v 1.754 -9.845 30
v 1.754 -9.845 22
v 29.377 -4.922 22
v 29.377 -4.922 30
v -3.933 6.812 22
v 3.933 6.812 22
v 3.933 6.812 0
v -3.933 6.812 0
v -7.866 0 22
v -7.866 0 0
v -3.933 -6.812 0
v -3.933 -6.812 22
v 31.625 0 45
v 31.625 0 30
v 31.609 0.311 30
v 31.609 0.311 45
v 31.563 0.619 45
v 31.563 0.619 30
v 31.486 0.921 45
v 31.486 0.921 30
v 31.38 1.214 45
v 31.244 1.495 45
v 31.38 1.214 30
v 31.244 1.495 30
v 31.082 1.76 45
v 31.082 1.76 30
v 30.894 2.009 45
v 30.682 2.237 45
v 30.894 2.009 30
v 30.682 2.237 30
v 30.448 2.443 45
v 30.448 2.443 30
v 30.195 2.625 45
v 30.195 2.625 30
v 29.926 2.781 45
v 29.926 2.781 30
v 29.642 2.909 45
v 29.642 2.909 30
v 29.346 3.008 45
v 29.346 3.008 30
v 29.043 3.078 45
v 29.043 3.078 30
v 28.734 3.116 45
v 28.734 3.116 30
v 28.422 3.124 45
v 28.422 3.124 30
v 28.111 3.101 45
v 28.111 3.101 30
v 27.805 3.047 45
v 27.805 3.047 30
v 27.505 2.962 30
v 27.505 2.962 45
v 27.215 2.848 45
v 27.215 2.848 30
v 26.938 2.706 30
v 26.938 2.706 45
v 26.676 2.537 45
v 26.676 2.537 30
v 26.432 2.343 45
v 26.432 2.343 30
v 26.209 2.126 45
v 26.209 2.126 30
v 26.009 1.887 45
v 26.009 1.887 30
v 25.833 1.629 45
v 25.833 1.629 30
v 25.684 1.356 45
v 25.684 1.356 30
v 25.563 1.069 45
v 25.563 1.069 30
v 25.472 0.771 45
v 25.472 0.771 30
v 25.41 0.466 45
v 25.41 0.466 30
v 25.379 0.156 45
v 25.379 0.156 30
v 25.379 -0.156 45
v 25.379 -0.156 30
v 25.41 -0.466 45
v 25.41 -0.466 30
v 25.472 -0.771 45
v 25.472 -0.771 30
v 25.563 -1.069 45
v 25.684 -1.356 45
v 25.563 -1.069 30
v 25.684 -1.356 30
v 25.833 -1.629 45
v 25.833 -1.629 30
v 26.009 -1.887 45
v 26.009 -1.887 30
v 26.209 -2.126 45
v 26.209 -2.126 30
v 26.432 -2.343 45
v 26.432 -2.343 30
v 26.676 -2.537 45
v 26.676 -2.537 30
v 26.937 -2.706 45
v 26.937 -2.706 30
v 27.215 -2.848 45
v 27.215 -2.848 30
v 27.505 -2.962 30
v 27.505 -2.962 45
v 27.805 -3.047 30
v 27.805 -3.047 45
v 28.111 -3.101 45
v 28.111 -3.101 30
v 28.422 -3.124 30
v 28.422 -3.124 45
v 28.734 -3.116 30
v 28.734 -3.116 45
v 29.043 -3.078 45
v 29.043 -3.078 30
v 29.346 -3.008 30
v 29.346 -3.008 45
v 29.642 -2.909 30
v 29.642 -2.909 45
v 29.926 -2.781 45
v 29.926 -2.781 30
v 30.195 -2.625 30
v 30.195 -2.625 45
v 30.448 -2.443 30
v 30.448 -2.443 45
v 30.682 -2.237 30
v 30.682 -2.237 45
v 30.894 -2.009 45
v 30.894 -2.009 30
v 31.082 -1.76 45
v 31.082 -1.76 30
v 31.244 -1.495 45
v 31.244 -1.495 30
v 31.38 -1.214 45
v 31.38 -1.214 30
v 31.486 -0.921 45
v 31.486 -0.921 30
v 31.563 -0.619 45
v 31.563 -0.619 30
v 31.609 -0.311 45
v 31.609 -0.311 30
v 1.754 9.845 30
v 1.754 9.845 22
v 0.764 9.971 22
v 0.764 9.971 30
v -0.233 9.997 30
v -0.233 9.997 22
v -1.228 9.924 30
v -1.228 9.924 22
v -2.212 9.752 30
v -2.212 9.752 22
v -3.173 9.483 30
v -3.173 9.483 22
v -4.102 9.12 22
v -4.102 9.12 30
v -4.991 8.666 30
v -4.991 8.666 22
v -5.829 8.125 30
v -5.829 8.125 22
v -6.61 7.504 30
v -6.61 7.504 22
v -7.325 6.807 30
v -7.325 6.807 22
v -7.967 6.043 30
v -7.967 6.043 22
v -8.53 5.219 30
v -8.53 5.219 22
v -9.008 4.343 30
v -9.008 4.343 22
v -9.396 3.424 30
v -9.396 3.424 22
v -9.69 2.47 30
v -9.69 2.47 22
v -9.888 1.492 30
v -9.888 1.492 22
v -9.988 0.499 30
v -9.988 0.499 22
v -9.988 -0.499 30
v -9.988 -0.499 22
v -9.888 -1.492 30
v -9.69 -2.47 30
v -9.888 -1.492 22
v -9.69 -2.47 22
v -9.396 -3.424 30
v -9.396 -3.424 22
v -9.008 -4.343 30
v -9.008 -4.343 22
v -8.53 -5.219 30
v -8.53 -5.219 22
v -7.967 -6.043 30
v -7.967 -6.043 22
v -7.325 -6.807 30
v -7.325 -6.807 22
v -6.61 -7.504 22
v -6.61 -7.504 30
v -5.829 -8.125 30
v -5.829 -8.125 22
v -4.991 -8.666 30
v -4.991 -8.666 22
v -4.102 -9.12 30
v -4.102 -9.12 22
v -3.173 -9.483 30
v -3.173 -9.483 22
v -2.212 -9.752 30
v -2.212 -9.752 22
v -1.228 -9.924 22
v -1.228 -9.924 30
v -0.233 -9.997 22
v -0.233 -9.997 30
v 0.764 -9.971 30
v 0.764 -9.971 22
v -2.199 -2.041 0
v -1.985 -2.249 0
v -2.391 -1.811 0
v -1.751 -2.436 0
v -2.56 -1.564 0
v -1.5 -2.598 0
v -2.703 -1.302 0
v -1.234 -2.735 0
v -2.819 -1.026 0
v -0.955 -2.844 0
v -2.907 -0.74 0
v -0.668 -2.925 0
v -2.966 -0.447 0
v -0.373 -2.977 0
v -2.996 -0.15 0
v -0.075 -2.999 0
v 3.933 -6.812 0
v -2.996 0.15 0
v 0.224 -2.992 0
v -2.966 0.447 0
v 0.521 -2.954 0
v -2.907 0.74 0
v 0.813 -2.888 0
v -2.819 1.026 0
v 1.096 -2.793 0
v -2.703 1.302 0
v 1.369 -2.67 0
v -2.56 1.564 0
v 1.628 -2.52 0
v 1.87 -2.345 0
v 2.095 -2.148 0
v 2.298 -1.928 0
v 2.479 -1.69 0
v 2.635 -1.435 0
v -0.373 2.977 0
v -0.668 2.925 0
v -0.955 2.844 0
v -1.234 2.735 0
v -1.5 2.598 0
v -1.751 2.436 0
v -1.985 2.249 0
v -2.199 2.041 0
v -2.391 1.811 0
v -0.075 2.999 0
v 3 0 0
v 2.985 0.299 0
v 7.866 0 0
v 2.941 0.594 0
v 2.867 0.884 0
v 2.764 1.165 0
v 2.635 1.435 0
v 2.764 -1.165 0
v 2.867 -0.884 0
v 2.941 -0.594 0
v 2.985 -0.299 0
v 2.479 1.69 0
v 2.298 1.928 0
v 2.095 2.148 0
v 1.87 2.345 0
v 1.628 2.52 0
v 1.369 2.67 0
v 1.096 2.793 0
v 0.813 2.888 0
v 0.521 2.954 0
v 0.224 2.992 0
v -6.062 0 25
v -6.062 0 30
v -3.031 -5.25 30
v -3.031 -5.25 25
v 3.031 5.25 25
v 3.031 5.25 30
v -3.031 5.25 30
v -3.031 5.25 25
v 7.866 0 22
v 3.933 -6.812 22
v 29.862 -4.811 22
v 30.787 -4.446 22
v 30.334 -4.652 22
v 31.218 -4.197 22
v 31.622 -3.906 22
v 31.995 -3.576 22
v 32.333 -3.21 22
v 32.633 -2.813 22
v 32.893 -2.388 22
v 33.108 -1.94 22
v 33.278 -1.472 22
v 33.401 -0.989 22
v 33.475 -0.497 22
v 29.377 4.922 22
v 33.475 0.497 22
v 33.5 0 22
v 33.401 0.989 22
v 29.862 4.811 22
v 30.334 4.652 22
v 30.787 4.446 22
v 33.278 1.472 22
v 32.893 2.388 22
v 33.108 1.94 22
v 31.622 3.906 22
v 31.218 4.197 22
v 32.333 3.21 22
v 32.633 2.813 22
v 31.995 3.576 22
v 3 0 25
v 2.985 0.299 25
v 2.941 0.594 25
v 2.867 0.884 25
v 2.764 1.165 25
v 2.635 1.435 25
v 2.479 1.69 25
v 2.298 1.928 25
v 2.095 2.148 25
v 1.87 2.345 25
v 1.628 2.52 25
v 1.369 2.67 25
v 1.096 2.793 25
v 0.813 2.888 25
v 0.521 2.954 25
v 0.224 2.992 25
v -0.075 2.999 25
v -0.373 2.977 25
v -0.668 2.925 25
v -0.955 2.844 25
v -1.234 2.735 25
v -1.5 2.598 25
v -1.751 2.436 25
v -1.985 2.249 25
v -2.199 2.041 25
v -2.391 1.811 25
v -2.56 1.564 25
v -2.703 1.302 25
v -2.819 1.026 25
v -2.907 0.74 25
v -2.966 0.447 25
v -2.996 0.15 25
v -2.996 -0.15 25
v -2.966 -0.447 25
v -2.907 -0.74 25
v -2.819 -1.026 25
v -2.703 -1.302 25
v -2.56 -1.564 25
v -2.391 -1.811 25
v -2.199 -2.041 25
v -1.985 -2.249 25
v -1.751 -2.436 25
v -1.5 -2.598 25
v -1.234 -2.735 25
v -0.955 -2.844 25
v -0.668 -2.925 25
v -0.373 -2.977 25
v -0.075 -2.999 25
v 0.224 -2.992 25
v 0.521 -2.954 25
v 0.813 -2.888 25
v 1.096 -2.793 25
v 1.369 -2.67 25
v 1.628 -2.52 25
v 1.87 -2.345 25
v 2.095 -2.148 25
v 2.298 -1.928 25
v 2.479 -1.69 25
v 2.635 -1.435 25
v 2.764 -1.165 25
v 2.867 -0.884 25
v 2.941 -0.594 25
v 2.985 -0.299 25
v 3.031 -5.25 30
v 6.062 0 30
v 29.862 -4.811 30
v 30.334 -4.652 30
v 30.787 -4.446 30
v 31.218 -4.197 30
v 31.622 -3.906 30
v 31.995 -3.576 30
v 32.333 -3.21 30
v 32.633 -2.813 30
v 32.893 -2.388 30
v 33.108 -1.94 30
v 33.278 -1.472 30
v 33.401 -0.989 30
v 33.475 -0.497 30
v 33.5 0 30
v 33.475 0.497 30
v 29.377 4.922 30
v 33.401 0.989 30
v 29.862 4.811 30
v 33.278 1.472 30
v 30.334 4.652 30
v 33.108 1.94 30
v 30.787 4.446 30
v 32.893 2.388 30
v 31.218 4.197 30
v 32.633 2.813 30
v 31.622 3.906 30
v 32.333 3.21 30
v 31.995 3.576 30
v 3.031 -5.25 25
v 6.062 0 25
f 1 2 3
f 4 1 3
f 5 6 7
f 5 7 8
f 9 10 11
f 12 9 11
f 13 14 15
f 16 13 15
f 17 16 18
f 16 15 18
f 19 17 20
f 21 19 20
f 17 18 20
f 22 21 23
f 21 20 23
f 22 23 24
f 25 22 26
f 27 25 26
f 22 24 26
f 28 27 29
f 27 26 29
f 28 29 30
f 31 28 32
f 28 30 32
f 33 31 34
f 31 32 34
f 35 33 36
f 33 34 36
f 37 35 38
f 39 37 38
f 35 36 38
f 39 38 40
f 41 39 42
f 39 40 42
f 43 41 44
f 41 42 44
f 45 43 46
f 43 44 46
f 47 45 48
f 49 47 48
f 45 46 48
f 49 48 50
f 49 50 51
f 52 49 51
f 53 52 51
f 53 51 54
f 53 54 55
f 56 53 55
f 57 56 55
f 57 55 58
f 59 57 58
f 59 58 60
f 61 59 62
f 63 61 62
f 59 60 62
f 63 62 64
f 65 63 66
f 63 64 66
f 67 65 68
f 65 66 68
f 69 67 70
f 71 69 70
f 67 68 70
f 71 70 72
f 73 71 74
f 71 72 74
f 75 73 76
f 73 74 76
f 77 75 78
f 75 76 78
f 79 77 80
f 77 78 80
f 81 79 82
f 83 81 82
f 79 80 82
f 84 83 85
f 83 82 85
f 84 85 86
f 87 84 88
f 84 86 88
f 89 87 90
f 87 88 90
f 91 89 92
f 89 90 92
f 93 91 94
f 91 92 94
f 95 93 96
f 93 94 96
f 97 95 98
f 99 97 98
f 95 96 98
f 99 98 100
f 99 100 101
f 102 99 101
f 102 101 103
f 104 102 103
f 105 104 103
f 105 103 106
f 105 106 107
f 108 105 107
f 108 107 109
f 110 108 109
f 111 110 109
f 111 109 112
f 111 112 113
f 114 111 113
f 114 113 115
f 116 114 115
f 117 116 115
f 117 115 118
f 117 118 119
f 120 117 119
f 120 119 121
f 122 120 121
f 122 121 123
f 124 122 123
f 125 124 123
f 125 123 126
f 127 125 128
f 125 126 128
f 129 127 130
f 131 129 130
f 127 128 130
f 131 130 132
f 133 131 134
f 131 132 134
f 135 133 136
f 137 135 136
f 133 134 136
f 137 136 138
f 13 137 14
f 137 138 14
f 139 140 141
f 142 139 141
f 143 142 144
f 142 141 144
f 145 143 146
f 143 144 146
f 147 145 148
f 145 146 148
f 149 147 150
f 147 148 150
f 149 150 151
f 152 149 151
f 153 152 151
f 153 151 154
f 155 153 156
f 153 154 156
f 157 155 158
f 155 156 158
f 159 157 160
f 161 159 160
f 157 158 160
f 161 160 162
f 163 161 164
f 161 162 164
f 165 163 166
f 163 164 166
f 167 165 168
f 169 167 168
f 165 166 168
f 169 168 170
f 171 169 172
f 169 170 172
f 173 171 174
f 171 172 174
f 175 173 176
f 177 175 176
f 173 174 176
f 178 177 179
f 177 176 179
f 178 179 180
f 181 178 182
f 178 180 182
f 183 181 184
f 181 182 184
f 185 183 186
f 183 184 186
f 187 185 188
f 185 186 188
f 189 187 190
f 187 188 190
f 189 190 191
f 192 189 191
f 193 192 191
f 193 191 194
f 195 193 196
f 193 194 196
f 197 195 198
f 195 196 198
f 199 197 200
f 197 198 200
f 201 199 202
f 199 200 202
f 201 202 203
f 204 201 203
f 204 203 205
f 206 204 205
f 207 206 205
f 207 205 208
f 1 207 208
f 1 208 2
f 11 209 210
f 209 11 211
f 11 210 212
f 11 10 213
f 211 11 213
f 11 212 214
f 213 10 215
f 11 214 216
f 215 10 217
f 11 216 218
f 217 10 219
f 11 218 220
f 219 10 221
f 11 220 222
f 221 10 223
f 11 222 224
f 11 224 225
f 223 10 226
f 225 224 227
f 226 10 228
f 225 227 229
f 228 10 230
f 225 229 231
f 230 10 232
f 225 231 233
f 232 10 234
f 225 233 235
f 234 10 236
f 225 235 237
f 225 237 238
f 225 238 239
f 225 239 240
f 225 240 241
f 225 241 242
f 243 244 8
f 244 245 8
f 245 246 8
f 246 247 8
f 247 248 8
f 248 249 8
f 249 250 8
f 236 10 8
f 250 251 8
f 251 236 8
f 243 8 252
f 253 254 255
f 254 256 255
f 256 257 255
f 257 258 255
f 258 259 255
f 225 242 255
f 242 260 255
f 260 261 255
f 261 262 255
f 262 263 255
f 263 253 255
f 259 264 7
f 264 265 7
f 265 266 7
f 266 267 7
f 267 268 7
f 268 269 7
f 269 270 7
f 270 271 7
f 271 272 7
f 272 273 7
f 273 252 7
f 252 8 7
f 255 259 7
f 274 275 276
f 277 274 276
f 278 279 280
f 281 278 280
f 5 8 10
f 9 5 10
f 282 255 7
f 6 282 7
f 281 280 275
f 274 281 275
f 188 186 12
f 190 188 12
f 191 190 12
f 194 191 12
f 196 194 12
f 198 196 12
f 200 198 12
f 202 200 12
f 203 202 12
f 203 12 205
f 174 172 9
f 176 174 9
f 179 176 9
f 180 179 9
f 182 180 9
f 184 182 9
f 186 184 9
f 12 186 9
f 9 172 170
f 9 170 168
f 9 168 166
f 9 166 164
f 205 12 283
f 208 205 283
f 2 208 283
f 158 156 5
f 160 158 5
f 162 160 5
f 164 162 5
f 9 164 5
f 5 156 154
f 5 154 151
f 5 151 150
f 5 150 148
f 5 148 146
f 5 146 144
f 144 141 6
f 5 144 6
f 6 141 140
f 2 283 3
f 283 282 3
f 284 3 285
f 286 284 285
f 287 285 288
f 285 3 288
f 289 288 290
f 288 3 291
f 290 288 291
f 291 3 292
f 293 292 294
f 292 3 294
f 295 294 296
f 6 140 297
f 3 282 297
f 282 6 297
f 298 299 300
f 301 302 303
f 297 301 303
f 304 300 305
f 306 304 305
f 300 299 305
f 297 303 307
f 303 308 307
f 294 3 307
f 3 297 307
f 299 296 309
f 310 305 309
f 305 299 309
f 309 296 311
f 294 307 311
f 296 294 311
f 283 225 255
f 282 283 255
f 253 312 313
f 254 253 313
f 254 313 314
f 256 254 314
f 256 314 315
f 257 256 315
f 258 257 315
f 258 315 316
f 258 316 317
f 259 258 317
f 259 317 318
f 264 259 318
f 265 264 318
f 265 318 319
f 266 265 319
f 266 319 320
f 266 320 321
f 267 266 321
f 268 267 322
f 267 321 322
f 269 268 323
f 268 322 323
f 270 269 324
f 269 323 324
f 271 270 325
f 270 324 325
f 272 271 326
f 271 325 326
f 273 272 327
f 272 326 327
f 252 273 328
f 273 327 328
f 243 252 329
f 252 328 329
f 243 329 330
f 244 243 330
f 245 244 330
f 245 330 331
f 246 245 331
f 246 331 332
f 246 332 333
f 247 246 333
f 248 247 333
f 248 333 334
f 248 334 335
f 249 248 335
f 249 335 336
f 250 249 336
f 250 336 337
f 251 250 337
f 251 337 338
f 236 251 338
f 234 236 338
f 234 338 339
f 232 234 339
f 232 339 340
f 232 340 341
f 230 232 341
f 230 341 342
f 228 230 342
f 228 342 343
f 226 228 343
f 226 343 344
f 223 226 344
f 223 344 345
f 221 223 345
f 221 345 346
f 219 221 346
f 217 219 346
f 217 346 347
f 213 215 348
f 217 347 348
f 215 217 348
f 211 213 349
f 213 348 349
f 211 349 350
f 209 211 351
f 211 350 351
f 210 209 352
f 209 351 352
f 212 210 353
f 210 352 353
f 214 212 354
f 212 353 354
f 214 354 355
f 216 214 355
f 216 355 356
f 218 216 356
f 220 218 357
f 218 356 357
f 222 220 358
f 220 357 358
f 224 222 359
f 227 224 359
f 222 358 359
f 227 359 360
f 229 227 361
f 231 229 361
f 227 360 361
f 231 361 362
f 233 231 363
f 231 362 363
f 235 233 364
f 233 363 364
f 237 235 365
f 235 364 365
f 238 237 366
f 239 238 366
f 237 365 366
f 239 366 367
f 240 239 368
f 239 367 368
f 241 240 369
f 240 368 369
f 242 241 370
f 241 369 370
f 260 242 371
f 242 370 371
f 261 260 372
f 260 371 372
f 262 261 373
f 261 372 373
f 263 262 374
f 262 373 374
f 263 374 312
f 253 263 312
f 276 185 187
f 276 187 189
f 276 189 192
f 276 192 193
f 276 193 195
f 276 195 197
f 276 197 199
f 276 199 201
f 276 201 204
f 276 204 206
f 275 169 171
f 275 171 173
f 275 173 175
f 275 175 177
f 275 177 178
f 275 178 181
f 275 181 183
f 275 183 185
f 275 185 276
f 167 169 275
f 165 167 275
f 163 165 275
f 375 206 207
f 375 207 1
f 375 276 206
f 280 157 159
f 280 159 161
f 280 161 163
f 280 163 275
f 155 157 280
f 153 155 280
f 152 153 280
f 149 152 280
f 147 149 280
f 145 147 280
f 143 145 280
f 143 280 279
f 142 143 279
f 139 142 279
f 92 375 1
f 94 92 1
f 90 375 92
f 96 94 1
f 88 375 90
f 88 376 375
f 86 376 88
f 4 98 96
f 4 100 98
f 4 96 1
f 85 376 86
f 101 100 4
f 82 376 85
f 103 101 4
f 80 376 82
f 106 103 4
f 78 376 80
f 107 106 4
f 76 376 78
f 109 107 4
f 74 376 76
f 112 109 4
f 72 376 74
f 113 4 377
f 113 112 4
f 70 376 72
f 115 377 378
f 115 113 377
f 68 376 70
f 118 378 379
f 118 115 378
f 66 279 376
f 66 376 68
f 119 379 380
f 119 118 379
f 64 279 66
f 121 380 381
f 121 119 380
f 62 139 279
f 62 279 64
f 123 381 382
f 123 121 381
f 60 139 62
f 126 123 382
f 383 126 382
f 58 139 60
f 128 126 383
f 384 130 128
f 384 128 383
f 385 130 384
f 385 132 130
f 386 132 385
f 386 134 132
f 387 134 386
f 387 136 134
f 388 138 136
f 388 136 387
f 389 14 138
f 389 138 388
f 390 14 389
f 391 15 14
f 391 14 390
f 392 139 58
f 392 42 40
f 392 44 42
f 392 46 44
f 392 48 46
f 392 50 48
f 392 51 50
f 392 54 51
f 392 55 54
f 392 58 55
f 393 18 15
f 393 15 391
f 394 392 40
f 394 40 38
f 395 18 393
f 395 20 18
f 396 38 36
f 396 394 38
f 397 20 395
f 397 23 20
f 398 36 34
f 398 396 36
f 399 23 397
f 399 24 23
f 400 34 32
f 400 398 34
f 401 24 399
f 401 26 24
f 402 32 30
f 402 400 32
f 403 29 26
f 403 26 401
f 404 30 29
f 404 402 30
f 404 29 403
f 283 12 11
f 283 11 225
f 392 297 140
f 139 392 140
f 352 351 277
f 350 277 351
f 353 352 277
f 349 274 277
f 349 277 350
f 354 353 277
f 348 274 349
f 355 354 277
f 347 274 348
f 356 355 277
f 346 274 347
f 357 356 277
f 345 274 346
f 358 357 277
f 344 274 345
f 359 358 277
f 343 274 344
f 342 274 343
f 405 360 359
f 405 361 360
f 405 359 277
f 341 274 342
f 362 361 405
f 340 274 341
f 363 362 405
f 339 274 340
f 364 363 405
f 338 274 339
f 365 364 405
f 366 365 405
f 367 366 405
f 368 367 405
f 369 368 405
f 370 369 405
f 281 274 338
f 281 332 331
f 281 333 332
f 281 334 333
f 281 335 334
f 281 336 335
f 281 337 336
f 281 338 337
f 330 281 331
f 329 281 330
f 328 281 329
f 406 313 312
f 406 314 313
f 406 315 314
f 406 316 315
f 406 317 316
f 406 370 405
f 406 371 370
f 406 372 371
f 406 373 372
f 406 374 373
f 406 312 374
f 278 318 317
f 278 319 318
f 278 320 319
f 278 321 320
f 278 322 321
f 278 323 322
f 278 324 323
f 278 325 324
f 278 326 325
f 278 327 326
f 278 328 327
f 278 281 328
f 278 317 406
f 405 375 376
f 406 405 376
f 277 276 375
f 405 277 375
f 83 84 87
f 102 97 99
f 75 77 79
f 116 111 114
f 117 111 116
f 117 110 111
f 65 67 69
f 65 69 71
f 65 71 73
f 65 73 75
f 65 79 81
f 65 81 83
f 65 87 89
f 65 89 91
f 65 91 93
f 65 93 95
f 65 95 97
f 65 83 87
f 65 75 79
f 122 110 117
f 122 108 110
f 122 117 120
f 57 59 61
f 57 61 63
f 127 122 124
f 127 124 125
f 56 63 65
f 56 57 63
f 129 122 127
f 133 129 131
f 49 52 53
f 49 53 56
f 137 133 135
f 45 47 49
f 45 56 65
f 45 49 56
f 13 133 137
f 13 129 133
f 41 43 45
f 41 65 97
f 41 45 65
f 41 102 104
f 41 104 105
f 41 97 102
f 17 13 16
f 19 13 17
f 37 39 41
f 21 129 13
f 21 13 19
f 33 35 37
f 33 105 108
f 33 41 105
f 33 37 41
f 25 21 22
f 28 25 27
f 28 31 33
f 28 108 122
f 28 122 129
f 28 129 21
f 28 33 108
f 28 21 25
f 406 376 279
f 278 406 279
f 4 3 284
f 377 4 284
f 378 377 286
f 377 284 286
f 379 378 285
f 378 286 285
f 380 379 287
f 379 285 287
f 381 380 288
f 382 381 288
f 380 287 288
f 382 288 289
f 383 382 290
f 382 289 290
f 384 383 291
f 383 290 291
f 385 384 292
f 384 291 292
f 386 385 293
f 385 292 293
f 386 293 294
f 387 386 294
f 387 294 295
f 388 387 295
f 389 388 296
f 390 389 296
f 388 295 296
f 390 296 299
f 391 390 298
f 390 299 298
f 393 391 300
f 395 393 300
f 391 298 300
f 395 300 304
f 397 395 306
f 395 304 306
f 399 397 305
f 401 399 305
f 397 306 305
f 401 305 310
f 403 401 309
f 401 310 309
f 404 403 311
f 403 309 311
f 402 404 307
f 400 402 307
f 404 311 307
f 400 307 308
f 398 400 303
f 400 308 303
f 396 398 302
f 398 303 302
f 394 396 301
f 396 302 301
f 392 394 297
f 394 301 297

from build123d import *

# Parameters (mm, degrees)
PAD046_DEPTH    = 22
PAD047_DEPTH    = 8
SKETCH080_R     = 3.125
PAD048_DEPTH    = 15
SKETCH081_R     = 3
HOLE_DEPTH      = 30.001
POCKET037_DEPTH = 5


with BuildPart() as part:
    # Sketch078 → Pad046 (new body)
    with BuildSketch(Plane.XY):
        Polygon((3.933199, 6.8125), (-3.933199, 6.8125), (-7.866397, 0), (-3.933199, -6.8125), (3.933199, -6.8125), (7.866397, 0), align=None)
    extrude(amount=PAD046_DEPTH)

    # Sketch079 (on Face8 of Pad046) → Pad047 (join)
    with BuildSketch(Plane.XY.offset(22)):
        with BuildLine():
            ThreePointArc((1.754386, 9.844904), (-10, 0), (1.754386, -9.844904))
            Line((1.754386, -9.844904), (29.377193, -4.922452))
            ThreePointArc((29.377193, -4.922452), (33.5, 0), (29.377193, 4.922452))
            Line((29.377193, 4.922452), (1.754386, 9.844904))
        make_face()
    extrude(amount=PAD047_DEPTH)

    # Sketch080 (on Face5 of Pad047) → Pad048 (join)
    with BuildSketch(Plane.XY.offset(30)):
        with Locations((28.5, 0)):
            Circle(SKETCH080_R)
    extrude(amount=PAD048_DEPTH)

    # Sketch081 (on Face5 of Pad048) → Hole (cut, through all)
    with BuildSketch(Plane.XY.offset(30)):
        Circle(SKETCH081_R)
    extrude(amount=-HOLE_DEPTH, mode=Mode.SUBTRACT)

    # Sketch082 (on Face5 of Hole) → Pocket037 (cut)
    with BuildSketch(Plane.XY.offset(30)):
        Polygon((3.031089, 5.25), (-3.031089, 5.25), (-6.062178, 0), (-3.031089, -5.25), (3.031089, -5.25), (6.062178, 0), align=None)
    extrude(amount=-POCKET037_DEPTH, mode=Mode.SUBTRACT)


solid = part.part
